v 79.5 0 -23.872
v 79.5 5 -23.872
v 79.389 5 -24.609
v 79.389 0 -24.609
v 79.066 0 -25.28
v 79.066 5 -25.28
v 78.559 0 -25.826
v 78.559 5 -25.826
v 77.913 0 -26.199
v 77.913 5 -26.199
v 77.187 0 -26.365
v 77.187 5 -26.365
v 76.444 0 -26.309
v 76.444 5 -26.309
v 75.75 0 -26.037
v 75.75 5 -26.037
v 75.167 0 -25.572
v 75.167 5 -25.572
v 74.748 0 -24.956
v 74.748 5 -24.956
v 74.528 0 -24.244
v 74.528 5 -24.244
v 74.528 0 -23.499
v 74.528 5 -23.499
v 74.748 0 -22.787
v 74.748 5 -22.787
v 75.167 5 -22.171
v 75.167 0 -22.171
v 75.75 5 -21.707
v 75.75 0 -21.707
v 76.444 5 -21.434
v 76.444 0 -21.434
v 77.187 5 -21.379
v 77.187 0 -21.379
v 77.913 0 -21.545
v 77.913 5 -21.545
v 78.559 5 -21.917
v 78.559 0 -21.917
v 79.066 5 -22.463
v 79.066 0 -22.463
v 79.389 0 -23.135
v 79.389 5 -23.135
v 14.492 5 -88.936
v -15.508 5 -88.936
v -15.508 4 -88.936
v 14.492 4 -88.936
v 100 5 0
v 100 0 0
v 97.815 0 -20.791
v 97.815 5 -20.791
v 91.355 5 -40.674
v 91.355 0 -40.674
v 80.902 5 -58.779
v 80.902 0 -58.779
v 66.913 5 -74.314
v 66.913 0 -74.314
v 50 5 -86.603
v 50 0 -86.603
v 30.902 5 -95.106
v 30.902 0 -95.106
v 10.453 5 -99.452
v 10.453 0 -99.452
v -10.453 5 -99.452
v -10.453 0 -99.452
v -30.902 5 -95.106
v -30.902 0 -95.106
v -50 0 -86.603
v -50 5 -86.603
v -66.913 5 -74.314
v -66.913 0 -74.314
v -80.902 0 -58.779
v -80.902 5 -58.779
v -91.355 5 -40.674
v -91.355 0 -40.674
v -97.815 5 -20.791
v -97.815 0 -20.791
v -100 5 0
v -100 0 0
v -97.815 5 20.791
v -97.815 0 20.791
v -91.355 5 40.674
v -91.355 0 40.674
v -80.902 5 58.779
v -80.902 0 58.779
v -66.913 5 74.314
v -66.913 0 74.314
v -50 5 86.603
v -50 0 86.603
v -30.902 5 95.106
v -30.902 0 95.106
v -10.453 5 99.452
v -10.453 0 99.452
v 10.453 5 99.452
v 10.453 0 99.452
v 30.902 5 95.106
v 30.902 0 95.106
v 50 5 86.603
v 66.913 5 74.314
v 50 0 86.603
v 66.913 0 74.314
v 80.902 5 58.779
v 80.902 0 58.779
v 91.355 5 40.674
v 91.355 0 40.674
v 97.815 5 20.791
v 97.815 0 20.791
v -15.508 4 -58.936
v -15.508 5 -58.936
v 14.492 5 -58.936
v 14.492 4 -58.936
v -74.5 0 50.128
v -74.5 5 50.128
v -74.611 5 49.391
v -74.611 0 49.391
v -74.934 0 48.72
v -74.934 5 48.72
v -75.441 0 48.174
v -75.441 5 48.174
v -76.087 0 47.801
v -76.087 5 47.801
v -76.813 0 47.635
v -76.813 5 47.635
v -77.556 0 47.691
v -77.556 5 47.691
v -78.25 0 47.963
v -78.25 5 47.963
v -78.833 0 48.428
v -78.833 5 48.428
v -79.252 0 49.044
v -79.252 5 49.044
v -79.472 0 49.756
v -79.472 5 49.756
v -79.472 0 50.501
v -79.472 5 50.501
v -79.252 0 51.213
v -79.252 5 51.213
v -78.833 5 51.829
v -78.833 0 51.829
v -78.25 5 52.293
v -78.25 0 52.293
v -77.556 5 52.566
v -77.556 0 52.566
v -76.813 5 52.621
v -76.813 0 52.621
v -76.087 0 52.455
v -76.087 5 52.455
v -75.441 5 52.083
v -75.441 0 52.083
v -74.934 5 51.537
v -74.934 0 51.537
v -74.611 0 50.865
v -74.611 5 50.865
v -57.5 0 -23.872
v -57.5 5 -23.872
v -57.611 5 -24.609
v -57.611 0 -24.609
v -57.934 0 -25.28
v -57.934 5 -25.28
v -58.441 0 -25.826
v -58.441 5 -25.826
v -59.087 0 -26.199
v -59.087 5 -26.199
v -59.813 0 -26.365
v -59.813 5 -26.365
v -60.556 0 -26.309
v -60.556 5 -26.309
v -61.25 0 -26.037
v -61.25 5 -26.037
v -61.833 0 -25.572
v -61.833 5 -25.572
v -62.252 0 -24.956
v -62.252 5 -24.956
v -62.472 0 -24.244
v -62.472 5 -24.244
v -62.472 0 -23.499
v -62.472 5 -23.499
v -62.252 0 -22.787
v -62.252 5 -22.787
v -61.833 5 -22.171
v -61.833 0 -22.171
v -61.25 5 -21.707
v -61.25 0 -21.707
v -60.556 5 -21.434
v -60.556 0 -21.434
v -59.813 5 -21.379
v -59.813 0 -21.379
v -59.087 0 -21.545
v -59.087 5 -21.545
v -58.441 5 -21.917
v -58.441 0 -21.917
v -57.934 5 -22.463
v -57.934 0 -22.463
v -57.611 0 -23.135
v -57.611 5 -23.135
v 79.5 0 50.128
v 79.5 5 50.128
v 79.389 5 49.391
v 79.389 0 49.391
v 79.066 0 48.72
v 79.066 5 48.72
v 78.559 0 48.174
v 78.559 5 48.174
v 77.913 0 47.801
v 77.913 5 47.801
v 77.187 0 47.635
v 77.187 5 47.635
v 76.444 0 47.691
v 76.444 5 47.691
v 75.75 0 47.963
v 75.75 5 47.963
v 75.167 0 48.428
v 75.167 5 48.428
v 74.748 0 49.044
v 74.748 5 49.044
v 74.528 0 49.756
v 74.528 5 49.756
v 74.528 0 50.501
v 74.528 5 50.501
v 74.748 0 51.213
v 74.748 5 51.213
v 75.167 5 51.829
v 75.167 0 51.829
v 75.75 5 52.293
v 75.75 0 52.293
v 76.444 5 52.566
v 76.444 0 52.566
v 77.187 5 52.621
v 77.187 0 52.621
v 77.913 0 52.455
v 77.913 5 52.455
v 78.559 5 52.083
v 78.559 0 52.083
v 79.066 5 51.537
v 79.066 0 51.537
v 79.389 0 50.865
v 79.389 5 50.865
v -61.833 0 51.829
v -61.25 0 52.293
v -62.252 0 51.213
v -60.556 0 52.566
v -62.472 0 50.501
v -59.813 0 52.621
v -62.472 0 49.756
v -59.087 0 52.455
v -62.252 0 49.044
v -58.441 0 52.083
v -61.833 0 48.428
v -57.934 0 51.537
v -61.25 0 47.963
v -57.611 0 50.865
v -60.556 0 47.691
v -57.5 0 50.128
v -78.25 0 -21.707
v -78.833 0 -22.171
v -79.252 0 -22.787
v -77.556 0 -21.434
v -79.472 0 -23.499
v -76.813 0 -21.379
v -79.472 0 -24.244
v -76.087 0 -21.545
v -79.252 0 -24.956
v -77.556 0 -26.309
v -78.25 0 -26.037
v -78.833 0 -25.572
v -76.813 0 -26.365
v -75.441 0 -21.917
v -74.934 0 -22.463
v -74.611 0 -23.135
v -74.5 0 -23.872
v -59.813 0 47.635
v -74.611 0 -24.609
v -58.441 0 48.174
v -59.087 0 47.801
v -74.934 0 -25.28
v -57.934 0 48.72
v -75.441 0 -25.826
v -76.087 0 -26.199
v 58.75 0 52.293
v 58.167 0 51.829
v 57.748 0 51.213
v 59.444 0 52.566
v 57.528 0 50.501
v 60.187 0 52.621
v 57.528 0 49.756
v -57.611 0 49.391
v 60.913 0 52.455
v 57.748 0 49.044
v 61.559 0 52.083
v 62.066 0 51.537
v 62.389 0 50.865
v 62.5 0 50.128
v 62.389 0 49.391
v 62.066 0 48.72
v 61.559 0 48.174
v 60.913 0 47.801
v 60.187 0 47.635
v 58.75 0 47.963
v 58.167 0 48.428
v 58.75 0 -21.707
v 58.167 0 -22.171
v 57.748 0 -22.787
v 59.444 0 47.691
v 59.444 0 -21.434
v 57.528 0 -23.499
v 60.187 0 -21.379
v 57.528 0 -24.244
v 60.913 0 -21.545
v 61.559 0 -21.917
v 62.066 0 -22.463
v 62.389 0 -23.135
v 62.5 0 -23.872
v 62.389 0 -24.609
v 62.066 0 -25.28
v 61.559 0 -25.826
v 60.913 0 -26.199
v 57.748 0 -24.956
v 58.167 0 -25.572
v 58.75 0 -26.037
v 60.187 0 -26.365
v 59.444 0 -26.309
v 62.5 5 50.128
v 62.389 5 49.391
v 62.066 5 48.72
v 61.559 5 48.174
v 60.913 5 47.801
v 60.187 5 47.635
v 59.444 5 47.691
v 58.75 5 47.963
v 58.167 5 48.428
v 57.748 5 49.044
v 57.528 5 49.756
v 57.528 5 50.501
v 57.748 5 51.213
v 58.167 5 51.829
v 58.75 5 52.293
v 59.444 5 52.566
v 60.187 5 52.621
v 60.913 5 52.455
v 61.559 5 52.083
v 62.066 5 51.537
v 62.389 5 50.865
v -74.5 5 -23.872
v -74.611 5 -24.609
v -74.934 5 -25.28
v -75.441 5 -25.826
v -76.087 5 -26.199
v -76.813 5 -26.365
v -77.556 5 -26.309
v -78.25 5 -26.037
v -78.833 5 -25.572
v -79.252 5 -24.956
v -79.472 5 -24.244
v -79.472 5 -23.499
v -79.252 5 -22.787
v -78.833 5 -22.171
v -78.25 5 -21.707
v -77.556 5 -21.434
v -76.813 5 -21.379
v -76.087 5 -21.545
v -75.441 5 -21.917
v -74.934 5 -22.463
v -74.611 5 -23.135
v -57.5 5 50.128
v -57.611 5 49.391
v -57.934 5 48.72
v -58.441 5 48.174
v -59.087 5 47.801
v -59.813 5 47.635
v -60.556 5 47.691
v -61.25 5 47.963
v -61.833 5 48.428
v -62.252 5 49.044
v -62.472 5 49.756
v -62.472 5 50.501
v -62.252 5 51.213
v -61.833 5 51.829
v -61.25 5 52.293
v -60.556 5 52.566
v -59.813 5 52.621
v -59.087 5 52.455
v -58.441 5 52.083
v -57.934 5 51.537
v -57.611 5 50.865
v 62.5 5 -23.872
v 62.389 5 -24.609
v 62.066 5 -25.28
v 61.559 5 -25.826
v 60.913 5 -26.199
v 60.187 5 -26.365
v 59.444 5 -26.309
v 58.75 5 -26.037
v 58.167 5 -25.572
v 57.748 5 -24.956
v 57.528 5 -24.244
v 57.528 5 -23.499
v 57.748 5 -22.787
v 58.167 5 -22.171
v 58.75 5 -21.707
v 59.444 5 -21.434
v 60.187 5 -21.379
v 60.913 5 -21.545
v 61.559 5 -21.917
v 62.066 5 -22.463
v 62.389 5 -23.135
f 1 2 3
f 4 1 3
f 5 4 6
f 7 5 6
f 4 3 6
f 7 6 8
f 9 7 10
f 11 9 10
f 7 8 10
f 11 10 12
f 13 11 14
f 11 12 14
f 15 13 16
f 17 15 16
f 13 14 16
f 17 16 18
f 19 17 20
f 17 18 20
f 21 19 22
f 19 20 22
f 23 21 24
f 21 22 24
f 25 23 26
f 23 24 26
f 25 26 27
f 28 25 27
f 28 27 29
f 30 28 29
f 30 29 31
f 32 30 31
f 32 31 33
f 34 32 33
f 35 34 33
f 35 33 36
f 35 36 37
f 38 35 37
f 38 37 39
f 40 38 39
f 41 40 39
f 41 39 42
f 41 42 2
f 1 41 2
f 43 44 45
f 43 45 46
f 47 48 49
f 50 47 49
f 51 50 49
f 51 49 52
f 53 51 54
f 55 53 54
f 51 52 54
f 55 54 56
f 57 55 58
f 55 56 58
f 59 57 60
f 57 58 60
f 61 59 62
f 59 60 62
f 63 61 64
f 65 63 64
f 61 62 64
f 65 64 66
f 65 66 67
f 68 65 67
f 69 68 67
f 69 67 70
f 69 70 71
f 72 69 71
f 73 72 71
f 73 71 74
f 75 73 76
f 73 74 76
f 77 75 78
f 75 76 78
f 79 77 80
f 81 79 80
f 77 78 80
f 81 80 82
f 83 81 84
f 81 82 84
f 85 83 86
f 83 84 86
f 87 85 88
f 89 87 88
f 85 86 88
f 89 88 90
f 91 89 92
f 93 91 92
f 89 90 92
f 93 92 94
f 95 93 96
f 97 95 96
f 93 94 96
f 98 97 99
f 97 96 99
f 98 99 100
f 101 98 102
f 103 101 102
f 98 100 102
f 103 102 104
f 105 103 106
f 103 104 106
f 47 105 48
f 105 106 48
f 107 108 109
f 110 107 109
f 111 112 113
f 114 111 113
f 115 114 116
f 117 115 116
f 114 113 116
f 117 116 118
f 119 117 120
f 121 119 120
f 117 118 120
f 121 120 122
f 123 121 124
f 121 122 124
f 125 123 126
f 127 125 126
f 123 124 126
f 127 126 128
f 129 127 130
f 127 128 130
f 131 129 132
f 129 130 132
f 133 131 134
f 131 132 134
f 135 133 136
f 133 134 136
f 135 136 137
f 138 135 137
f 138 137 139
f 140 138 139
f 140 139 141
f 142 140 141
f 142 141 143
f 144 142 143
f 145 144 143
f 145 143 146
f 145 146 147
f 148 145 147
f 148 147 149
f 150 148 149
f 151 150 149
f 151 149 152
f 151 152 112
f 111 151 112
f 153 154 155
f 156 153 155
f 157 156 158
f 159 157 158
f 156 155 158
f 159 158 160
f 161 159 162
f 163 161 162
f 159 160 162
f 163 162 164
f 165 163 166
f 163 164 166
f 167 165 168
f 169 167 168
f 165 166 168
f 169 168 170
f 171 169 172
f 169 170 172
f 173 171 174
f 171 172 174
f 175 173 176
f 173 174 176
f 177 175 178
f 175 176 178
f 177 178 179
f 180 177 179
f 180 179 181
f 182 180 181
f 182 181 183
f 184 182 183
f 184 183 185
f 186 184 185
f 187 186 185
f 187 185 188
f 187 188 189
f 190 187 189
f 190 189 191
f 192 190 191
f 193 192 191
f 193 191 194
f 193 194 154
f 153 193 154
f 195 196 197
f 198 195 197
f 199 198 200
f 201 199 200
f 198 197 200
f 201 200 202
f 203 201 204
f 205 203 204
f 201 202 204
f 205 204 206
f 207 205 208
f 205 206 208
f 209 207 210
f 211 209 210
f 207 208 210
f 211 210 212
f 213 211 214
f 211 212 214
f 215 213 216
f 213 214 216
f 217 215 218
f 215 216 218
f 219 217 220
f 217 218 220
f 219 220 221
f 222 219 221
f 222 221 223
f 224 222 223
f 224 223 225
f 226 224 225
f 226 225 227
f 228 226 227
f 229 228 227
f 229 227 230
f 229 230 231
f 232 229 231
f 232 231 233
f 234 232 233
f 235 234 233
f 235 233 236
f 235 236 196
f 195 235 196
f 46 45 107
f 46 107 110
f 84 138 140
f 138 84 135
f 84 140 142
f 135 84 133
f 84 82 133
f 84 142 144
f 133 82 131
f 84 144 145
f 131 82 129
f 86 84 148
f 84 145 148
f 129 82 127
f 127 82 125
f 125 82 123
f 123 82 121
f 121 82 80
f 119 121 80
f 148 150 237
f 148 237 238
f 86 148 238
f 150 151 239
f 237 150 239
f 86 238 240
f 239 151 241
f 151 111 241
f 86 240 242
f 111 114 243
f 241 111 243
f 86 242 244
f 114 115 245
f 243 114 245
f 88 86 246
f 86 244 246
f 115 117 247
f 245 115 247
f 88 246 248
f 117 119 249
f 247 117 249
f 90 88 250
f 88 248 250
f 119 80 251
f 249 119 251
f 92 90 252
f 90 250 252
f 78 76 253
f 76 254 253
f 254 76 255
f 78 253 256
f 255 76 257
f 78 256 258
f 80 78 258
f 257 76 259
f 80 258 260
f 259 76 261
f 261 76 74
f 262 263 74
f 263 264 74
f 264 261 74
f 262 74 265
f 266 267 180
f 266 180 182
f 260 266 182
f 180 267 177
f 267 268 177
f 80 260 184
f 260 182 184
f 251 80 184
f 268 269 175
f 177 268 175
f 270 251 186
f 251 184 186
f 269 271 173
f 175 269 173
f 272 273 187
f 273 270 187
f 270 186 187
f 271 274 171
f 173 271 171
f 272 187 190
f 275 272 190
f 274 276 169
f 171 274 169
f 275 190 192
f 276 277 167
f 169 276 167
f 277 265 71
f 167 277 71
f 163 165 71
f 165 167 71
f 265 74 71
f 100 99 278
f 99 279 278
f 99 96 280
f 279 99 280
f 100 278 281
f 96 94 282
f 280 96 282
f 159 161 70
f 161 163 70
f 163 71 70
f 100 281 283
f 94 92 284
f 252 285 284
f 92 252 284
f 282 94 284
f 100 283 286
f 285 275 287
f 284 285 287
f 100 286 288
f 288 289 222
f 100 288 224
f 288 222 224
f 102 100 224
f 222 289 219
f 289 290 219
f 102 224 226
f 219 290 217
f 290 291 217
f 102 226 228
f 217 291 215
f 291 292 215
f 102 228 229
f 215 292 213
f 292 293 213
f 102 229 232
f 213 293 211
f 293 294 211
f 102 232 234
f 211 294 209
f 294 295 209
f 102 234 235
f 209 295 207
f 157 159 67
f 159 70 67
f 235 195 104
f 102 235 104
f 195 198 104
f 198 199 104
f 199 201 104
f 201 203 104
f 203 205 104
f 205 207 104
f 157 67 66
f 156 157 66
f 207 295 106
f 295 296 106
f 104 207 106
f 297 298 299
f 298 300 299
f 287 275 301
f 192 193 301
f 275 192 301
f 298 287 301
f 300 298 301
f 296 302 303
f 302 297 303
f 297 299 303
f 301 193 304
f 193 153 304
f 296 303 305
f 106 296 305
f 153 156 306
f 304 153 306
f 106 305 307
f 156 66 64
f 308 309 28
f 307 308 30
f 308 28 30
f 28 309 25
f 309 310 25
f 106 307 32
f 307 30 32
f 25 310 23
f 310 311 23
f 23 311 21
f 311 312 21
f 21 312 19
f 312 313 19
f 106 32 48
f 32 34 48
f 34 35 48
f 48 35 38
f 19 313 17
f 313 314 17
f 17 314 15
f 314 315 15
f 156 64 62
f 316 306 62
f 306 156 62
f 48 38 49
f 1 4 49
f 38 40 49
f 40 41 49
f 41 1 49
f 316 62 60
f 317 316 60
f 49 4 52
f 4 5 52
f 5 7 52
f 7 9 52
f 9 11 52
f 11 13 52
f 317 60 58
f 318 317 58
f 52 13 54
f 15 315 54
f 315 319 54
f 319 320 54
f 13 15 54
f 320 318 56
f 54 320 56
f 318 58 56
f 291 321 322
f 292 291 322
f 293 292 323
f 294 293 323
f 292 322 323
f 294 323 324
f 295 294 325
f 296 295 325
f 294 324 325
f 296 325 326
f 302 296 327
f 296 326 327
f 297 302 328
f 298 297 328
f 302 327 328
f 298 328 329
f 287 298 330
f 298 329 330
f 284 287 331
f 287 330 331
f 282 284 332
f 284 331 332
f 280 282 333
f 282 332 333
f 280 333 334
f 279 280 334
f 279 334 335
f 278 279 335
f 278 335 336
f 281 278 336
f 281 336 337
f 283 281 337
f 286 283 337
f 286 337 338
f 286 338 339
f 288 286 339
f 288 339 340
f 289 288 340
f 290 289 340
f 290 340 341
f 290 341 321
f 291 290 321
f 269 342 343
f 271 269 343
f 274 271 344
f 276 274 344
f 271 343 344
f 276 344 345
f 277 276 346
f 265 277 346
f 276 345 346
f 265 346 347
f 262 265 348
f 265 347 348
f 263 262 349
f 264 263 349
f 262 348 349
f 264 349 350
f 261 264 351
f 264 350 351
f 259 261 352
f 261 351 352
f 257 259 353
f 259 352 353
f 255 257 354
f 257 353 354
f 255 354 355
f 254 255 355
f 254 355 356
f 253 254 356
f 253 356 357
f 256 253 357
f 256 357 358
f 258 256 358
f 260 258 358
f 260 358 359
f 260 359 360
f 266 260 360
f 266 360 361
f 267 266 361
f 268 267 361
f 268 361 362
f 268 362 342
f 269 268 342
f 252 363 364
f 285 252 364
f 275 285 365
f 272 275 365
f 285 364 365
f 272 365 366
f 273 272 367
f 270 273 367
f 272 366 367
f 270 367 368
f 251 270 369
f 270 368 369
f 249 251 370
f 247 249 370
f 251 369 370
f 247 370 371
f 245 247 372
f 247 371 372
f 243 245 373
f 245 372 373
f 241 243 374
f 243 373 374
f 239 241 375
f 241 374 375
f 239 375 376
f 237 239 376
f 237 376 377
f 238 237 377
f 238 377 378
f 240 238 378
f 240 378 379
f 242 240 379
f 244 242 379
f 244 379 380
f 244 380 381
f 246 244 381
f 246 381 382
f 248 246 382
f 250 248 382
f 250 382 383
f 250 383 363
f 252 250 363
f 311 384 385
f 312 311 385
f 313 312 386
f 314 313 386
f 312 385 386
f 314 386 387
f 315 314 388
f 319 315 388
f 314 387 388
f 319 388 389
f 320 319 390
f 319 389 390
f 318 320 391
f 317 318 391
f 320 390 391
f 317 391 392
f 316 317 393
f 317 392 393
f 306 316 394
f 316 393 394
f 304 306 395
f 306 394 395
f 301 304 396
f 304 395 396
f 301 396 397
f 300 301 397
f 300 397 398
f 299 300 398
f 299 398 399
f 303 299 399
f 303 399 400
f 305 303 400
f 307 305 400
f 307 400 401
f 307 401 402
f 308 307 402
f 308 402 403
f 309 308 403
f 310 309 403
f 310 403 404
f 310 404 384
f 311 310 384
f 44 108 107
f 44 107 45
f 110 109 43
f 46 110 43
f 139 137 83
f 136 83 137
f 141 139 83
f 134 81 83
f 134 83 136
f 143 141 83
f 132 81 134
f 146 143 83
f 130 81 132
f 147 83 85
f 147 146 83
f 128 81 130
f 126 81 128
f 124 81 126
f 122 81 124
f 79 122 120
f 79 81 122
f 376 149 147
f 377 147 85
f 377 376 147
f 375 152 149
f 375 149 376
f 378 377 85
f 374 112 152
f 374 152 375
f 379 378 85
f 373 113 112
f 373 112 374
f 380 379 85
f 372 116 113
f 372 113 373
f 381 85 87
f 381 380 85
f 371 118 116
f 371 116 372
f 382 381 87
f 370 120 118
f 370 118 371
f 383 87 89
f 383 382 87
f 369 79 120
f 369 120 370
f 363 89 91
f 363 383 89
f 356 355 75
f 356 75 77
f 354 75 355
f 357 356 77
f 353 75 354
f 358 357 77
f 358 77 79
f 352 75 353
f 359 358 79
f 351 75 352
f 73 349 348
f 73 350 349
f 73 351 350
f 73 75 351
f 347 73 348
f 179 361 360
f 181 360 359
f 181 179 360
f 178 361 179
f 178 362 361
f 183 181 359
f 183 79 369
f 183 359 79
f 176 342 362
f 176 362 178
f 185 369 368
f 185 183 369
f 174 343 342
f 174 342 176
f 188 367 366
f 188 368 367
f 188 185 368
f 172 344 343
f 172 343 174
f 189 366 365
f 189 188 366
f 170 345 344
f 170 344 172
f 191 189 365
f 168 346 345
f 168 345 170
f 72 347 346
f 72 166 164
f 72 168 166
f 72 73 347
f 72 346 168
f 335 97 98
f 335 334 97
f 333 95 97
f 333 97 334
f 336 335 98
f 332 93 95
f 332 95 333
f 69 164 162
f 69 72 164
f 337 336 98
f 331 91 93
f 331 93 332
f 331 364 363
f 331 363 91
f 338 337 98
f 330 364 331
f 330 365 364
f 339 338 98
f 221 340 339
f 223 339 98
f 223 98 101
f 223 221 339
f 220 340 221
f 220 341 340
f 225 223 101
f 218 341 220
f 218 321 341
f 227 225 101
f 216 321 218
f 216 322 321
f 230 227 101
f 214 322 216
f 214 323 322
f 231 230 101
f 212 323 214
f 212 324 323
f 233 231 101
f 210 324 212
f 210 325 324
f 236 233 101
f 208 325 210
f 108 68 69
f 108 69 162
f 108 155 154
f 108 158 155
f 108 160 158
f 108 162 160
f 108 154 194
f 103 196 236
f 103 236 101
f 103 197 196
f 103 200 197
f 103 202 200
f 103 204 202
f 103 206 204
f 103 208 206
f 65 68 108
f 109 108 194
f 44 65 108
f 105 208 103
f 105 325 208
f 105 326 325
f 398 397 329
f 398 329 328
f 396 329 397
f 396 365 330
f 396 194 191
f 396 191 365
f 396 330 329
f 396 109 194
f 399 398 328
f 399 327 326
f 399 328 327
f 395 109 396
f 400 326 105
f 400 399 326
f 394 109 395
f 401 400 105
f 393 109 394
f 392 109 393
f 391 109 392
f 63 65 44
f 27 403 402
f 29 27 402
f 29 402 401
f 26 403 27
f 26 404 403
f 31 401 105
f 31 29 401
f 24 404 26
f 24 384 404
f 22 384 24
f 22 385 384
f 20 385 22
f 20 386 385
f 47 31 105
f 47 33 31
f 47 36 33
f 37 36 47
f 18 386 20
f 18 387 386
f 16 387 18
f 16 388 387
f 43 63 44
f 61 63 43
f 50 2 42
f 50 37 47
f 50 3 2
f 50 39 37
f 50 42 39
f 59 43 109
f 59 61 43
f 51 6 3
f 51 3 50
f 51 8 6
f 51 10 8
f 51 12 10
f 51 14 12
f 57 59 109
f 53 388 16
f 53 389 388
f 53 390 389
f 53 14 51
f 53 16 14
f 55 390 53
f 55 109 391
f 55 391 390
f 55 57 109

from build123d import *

# Parameters (mm, degrees)
SKETCH1_R           = 100
BOSS_EXTRUDE1_DEPTH = 5
SKETCH2_R           = 2.5
CUT_EXTRUDE1_DEPTH  = 10
SKETCH3_W           = 30
SKETCH3_H           = 30
CUT_EXTRUDE2_DEPTH  = 1


with BuildPart() as part:
    # Sketch1 → Boss-Extrude1 (new body)
    with BuildSketch(Plane(origin=(0, 0, 0), x_dir=(1, 0, 0), z_dir=(0, 1, 0))):
        Circle(SKETCH1_R)
    extrude(amount=BOSS_EXTRUDE1_DEPTH)

    # Sketch2 → Cut-Extrude1 (cut)
    with BuildSketch(Plane(origin=(0, 5, 0), x_dir=(1, 0, 0), z_dir=(0, 1, 0))):
        with Locations((-77, -50.128296411)):
            Circle(SKETCH2_R)
        with Locations((-77, 23.871703589)):
            Circle(SKETCH2_R)
        with Locations((-60, -50.128296411)):
            Circle(SKETCH2_R)
        with Locations((-60, 23.871703589)):
            Circle(SKETCH2_R)
        with Locations((60, 23.871703589)):
            Circle(SKETCH2_R)
        with Locations((60, -50.128296411)):
            Circle(SKETCH2_R)
        with Locations((77, 23.871703589)):
            Circle(SKETCH2_R)
        with Locations((77, -50.128296411)):
            Circle(SKETCH2_R)
    extrude(amount=-CUT_EXTRUDE1_DEPTH, mode=Mode.SUBTRACT)

    # Sketch3 → Cut-Extrude2 (cut)
    with BuildSketch(Plane(origin=(0, 5, 0), x_dir=(1, 0, 0), z_dir=(0, 1, 0))):
        with Locations((-0.508280415, 73.936051257)):
            Rectangle(SKETCH3_W, SKETCH3_H)
    extrude(amount=-CUT_EXTRUDE2_DEPTH, mode=Mode.SUBTRACT)


solid = part.part
